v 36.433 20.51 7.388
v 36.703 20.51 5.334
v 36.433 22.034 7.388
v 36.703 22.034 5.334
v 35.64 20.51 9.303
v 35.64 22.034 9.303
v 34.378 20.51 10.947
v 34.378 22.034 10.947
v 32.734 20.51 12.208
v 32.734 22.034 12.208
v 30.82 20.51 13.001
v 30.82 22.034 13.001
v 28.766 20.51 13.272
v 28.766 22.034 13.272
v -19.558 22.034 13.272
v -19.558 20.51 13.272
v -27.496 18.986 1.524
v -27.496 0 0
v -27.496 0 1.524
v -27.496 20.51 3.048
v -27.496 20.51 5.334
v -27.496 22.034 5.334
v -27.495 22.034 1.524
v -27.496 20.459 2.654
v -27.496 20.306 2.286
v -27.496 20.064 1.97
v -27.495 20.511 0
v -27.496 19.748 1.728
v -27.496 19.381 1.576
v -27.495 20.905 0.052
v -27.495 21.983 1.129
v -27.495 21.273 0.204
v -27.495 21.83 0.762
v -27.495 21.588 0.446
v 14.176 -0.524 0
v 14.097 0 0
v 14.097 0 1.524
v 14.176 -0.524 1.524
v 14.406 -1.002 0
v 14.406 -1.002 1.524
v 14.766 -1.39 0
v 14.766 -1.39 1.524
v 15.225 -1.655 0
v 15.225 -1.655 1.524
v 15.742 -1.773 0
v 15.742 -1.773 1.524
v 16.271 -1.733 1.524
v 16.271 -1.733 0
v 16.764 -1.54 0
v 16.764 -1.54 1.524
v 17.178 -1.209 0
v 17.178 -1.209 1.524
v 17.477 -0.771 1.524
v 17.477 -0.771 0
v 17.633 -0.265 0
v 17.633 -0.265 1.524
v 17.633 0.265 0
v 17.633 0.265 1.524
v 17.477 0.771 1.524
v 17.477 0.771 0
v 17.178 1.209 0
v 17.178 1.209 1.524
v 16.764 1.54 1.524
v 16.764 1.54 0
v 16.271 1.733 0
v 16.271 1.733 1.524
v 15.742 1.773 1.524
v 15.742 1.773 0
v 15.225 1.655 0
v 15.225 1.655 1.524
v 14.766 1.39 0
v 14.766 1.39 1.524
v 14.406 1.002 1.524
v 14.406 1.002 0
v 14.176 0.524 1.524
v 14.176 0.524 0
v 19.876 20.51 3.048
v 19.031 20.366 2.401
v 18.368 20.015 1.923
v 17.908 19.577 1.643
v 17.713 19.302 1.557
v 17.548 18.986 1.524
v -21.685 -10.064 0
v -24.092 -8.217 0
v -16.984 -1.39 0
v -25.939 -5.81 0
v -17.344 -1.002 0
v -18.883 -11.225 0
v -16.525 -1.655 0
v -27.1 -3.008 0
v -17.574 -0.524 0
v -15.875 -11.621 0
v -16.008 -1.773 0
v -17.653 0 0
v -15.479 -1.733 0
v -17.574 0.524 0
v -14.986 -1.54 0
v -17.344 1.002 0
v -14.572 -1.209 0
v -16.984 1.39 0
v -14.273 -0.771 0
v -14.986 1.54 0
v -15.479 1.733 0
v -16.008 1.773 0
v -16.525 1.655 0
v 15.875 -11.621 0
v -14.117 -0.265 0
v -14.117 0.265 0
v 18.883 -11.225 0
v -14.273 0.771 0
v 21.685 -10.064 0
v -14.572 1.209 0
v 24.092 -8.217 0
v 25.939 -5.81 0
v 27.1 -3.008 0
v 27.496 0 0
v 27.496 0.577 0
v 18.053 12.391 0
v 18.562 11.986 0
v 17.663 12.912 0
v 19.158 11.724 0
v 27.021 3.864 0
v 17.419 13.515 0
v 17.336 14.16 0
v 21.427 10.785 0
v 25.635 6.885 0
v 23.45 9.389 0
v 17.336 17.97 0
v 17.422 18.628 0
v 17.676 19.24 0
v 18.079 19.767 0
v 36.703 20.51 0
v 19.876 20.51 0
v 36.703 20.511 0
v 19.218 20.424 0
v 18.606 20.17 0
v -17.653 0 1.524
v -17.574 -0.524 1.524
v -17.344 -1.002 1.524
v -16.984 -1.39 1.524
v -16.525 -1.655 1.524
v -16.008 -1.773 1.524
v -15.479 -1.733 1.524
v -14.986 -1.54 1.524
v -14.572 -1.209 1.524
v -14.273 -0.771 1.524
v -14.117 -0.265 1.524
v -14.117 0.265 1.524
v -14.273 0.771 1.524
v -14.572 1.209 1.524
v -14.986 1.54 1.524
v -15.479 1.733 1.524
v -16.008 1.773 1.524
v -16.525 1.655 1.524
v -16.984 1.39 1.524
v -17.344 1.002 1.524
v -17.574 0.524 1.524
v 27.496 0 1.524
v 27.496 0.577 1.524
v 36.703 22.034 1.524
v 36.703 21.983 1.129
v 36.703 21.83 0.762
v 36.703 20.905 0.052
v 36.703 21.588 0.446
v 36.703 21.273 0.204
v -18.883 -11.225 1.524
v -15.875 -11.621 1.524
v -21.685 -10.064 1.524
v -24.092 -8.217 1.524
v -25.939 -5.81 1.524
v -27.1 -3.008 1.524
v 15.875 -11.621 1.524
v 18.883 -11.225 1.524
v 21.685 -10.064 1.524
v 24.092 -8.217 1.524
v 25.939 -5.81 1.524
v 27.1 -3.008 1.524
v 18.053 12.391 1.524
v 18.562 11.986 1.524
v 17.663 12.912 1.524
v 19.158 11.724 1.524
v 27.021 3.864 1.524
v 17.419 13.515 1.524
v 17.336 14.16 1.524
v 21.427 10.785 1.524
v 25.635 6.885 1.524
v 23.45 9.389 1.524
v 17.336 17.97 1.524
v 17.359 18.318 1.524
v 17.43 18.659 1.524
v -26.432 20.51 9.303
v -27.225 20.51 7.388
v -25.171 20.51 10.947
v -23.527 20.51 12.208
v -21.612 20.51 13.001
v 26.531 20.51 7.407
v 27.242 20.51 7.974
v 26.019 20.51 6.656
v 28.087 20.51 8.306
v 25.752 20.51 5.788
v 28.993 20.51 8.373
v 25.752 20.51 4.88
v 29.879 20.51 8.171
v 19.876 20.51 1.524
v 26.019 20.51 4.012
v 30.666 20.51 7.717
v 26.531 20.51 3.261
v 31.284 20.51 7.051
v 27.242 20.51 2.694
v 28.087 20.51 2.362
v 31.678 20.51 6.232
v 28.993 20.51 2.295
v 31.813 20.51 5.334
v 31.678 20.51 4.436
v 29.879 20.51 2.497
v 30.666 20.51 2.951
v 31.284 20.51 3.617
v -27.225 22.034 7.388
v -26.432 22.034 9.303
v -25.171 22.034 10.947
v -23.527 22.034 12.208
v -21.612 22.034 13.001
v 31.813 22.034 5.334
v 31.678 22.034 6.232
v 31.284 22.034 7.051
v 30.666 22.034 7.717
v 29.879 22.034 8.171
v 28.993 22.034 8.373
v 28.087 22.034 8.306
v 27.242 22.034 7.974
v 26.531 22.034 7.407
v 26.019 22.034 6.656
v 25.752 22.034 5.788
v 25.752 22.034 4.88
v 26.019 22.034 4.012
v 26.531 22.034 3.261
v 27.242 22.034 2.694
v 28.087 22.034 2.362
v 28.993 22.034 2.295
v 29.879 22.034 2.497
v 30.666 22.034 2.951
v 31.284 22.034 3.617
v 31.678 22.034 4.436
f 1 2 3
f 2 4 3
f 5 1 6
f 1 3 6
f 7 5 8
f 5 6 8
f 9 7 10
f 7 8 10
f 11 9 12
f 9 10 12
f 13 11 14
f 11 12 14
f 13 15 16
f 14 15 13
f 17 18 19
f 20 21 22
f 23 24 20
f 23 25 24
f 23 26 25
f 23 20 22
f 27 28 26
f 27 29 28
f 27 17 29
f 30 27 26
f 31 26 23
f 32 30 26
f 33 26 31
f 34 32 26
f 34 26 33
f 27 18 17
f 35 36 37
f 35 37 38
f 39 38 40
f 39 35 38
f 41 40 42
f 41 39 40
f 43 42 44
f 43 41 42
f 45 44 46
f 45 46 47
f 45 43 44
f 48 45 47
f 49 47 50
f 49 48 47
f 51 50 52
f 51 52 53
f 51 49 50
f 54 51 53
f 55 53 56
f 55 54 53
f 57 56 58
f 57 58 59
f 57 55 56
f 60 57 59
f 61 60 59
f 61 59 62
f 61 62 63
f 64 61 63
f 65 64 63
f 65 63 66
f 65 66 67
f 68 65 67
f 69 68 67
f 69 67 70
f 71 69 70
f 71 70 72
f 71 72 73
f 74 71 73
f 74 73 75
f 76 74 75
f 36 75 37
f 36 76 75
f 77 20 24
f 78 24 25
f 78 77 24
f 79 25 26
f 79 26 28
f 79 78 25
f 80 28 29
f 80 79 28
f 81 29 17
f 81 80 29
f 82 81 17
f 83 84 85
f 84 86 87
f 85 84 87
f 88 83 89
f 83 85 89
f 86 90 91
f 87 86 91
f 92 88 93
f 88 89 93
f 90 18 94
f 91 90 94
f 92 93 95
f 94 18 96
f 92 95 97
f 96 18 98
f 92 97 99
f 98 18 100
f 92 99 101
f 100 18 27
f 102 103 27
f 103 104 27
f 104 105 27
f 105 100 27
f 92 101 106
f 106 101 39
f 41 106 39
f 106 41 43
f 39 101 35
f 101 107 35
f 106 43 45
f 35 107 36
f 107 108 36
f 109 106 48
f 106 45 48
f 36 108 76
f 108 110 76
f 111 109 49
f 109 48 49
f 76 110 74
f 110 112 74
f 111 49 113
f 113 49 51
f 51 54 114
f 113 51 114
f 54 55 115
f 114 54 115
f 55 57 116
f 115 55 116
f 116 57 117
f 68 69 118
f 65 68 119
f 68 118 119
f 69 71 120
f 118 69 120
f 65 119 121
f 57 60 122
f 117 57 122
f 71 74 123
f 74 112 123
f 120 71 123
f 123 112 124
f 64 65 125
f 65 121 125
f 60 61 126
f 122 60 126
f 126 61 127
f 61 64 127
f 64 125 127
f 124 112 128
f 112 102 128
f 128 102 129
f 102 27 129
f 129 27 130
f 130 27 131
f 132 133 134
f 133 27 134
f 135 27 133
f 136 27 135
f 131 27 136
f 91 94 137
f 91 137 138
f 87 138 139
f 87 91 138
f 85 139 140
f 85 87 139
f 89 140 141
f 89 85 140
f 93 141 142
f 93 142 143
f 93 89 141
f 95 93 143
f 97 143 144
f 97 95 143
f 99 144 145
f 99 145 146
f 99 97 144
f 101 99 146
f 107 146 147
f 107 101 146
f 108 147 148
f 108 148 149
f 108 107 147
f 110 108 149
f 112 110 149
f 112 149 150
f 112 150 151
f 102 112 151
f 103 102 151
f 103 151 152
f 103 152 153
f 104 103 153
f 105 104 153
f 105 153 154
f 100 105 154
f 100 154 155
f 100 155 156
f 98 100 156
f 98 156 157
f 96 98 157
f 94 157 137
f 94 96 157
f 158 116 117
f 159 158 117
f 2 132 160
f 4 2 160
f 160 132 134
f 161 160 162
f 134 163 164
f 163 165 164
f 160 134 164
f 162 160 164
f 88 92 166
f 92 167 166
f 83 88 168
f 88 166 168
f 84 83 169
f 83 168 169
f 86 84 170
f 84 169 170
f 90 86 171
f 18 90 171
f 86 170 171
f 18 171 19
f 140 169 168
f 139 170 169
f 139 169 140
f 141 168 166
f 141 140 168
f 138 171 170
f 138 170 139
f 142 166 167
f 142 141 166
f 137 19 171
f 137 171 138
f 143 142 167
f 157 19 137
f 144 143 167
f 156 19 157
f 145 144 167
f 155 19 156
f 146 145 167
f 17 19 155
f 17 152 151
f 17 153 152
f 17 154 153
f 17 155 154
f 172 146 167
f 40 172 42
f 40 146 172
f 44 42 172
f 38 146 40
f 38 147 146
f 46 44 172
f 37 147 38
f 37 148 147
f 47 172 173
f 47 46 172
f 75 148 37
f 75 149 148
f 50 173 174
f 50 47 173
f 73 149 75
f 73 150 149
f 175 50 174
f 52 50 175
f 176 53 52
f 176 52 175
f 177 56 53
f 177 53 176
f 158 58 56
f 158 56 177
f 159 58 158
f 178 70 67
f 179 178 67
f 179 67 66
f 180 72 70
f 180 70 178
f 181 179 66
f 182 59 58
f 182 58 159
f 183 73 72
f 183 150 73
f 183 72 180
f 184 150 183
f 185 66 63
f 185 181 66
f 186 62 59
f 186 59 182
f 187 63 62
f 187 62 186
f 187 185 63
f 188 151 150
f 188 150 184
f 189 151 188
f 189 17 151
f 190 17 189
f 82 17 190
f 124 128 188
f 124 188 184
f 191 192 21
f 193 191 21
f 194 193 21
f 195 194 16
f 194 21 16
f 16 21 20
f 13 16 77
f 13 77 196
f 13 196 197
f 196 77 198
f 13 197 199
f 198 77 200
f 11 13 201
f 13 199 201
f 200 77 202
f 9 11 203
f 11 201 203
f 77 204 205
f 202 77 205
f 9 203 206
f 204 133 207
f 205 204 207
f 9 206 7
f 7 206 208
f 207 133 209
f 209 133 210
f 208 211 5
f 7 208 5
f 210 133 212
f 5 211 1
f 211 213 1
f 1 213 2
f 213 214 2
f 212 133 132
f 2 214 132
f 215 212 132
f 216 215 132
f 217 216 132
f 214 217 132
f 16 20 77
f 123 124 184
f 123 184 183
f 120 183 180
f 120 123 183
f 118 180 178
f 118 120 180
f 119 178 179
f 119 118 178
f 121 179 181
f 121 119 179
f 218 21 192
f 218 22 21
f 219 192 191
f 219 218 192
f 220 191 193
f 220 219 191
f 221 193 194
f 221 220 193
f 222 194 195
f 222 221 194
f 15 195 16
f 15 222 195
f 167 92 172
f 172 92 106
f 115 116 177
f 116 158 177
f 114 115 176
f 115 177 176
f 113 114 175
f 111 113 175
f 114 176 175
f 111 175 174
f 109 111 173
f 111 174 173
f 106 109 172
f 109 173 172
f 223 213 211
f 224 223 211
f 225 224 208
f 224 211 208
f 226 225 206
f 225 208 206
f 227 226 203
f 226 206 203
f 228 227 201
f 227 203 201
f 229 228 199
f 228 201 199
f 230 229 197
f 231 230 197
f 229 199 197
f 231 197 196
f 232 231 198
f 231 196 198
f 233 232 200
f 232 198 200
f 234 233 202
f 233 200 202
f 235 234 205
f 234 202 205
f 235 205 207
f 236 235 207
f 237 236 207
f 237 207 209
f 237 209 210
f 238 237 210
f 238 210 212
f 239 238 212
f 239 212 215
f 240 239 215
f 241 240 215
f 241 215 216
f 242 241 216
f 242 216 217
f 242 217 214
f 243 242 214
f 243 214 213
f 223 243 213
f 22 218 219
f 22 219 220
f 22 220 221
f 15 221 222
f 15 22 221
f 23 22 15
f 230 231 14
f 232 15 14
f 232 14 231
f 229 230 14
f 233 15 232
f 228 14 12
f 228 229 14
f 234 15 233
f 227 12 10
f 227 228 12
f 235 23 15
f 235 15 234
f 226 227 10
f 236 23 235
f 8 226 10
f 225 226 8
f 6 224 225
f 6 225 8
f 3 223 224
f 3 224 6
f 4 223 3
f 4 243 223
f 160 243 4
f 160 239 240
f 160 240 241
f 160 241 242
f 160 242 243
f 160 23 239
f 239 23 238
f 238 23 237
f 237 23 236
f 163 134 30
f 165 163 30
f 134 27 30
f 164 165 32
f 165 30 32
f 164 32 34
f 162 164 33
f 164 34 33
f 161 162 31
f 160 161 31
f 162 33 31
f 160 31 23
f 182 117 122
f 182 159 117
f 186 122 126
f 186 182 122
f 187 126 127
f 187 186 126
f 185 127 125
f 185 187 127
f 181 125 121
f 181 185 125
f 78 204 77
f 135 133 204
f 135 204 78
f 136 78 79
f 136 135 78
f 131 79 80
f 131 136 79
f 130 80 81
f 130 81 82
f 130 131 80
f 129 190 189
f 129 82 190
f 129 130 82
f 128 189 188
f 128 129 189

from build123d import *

# Parameters (mm, degrees)
SKETCH1_R           = 1.778
BOSS_EXTRUDE1_DEPTH = 1.524
SKETCH2_W           = 19.05
SKETCH2_H           = 1.524
BOSS_EXTRUDE2_DEPTH = 11.7475
SKETCH3_R           = 3.048
CUT_EXTRUDE2_DEPTH  = 13.9446
CUT_EXTRUDE3_DEPTH  = 13.9446
SKETCH5_W           = 45.1485
SKETCH5_H           = 1.524
BOSS_EXTRUDE3_DEPTH = 11.7475
FILLET1_R           = 7.9375
FILLET3_R           = 11.6205
FILLET4_R           = 11.6205
FILLET5_R           = 1.524
FILLET6_R           = 1.524
FILLET7_R           = 7.9375


with BuildPart() as part:
    # Sketch1 → Boss-Extrude1 (new body)
    with BuildSketch(Plane.XY):
        Polygon((27.4955, 11.6205), (36.703, 20.5105), (36.703, 22.0345), (-27.4955, 22.0345), (-27.4955, 7.4295), (-27.4955, -11.6205), (27.4955, -11.6205), align=None)
        with Locations(Location((15.875, 0, 0), (0, 0, 180))):
            Circle(SKETCH1_R, mode=Mode.SUBTRACT)
        with Locations(Location((-15.875, 0, 0), (0, 0, 180))):
            Circle(SKETCH1_R, mode=Mode.SUBTRACT)
    extrude(amount=BOSS_EXTRUDE1_DEPTH)

    # Sketch2 → Boss-Extrude2 (add)
    with BuildSketch(Plane.XY.offset(1.524)):
        with Locations((27.178, 21.2725)):
            Rectangle(SKETCH2_W, SKETCH2_H)
    extrude(amount=BOSS_EXTRUDE2_DEPTH)

    # Sketch3 → Cut-Extrude2 (cut)
    with BuildSketch(Plane.XZ.offset(-20.5105)):
        with Locations((28.7655, 5.334)):
            Circle(SKETCH3_R)
    extrude(amount=-CUT_EXTRUDE2_DEPTH, mode=Mode.SUBTRACT)

    # Sketch4 → Cut-Extrude3 (cut)
    with BuildSketch(Plane(origin=(0, 0, 0), x_dir=(-1, 0, 0), z_dir=(0, 0, -1))):
        with BuildLine():
            Line((-19.8755, 11.6205), (-36.703, 11.6205))
            Line((-36.703, 11.6205), (-36.703, 20.5105))
            Line((-36.703, 20.5105), (-19.8755, 20.5105))
            ThreePointArc((-19.8755, 20.5105), (-18.079448776, 19.766551224), (-17.3355, 17.9705))
            Line((-17.3355, 17.9705), (-17.3355, 14.1605))
            ThreePointArc((-17.3355, 14.1605), (-18.079448776, 12.364448776), (-19.8755, 11.6205))
        make_face()
    extrude(amount=-CUT_EXTRUDE3_DEPTH, mode=Mode.SUBTRACT)

    # Sketch5 → Boss-Extrude3 (add)
    with BuildSketch(Plane.XY.offset(1.524)):
        with Locations((-4.92125, 21.2725)):
            Rectangle(SKETCH5_W, SKETCH5_H)
    extrude(amount=BOSS_EXTRUDE3_DEPTH)

    # Fillet1
    fillet1_edges = [part.edges().sort_by_distance(p)[0] for p in [
        (36.703, 21.2725, 13.2715),
    ]]
    fillet(fillet1_edges, radius=FILLET1_R)

    # Fillet3
    fillet3_edges = [part.edges().sort_by_distance(p)[0] for p in [
        (27.4955, -11.6205, 0.762),
    ]]
    fillet(fillet3_edges, radius=FILLET3_R)

    # Fillet4
    fillet4_edges = [part.edges().sort_by_distance(p)[0] for p in [
        (-27.4955, -11.6205, 0.762),
        (27.4955, 11.6205, 0.762),
    ]]
    fillet(fillet4_edges, radius=FILLET4_R)

    # Fillet5
    fillet5_edges = [part.edges().sort_by_distance(p)[0] for p in [
        (-3.81, 20.5105, 1.524),
    ]]
    fillet(fillet5_edges, radius=FILLET5_R)

    # Fillet6
    fillet6_edges = [part.edges().sort_by_distance(p)[0] for p in [
        (4.60375, 22.0345, 0),
    ]]
    fillet(fillet6_edges, radius=FILLET6_R - 0.0001)  # a hair under: the kernel refuses the full size

    # Fillet7
    fillet7_edges = [part.edges().sort_by_distance(p)[0] for p in [
        (-27.4955, 21.2725, 13.2715),
    ]]
    fillet(fillet7_edges, radius=FILLET7_R)


solid = part.part
